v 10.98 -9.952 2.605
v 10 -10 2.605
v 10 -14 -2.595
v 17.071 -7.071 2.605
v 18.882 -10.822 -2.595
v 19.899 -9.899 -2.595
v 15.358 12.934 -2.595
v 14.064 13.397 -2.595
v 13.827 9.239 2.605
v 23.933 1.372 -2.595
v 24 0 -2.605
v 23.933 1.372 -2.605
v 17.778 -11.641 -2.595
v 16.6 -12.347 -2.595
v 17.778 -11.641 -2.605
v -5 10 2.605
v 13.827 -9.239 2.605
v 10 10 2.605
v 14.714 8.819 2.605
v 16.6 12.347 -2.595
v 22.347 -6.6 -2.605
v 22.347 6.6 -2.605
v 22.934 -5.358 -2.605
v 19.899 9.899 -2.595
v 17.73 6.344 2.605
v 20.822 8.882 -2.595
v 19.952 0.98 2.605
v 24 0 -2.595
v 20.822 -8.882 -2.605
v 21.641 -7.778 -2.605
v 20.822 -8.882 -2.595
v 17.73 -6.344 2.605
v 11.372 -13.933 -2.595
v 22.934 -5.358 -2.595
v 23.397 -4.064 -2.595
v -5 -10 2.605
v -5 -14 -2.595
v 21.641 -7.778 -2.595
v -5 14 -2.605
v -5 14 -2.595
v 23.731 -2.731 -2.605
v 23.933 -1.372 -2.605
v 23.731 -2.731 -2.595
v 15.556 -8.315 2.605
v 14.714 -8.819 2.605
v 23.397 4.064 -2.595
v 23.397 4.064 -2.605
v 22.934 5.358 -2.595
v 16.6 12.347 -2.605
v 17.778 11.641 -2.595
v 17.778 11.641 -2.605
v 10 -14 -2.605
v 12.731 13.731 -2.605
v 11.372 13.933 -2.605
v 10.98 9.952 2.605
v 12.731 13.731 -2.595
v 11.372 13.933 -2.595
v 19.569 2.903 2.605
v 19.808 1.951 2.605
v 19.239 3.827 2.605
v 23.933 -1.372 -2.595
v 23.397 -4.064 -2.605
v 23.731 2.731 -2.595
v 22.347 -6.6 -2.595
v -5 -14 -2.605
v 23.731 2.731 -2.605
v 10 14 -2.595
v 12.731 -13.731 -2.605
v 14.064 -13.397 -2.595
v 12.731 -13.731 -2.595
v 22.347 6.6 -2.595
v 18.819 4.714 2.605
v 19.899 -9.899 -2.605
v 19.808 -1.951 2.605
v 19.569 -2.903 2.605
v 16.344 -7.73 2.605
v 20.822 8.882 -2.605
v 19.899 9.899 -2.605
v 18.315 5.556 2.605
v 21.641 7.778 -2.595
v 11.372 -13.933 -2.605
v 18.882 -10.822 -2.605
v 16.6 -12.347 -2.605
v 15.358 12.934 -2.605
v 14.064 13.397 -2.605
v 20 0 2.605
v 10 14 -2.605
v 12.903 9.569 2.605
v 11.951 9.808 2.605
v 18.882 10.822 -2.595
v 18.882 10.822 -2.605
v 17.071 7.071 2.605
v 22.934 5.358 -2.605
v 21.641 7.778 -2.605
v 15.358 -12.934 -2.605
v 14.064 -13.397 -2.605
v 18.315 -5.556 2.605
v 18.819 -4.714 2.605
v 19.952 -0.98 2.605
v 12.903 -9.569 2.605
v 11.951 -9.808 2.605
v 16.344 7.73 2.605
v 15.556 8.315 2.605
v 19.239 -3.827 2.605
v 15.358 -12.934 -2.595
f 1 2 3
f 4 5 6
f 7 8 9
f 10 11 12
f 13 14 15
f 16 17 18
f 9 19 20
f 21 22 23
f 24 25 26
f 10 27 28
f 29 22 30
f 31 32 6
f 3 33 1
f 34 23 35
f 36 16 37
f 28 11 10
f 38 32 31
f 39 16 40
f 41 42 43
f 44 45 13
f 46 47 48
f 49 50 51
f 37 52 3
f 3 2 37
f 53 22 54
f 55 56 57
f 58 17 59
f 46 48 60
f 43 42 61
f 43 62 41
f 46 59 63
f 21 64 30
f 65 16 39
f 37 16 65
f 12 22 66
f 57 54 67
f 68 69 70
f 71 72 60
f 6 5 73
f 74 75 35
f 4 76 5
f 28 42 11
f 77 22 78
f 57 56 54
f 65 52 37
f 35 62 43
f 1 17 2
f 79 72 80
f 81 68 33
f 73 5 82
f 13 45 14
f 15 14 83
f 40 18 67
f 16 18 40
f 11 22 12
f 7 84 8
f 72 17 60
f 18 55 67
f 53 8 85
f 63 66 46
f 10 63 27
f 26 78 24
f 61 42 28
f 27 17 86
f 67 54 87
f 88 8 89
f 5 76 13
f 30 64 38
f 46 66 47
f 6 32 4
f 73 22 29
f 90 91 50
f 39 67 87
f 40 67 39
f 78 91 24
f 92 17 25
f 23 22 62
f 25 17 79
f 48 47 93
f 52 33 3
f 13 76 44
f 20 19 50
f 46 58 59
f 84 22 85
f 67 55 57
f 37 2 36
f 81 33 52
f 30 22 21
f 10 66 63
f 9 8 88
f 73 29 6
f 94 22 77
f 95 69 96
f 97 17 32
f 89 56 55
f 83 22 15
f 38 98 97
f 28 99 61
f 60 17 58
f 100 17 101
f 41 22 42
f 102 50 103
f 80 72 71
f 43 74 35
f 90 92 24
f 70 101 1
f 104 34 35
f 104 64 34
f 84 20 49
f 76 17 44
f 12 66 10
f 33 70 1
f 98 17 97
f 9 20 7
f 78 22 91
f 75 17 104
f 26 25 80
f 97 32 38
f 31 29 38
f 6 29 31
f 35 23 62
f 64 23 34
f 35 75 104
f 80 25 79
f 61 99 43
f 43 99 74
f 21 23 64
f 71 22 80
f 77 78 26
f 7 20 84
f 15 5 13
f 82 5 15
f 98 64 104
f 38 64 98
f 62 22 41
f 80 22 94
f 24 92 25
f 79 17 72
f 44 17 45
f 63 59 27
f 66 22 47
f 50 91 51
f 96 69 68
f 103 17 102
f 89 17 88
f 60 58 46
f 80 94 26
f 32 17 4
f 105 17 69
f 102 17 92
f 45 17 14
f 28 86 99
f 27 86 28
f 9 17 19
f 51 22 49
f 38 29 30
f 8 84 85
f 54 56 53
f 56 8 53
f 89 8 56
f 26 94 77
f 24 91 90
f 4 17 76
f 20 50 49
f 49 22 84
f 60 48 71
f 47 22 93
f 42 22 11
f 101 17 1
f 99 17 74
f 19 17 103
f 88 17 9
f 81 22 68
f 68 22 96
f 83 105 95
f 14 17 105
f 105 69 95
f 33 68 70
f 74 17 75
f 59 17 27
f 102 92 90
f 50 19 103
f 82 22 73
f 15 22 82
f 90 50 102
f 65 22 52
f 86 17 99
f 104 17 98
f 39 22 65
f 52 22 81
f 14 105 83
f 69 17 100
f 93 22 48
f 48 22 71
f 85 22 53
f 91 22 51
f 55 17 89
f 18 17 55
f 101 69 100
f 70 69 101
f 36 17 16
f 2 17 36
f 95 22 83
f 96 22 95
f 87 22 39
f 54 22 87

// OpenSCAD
$fn=64;

hull() {
    translate([10,0,-2.6]) cylinder(d=28,h=0.01,center=true);
    translate([10,0,2.6]) cylinder(d=20,h=0.01,center=true);
    translate([0,0,-2.6]) cube([10,28,0.01],center=true);
    translate([0,0,2.6]) cube([10,20,0.01],center=true);
}
